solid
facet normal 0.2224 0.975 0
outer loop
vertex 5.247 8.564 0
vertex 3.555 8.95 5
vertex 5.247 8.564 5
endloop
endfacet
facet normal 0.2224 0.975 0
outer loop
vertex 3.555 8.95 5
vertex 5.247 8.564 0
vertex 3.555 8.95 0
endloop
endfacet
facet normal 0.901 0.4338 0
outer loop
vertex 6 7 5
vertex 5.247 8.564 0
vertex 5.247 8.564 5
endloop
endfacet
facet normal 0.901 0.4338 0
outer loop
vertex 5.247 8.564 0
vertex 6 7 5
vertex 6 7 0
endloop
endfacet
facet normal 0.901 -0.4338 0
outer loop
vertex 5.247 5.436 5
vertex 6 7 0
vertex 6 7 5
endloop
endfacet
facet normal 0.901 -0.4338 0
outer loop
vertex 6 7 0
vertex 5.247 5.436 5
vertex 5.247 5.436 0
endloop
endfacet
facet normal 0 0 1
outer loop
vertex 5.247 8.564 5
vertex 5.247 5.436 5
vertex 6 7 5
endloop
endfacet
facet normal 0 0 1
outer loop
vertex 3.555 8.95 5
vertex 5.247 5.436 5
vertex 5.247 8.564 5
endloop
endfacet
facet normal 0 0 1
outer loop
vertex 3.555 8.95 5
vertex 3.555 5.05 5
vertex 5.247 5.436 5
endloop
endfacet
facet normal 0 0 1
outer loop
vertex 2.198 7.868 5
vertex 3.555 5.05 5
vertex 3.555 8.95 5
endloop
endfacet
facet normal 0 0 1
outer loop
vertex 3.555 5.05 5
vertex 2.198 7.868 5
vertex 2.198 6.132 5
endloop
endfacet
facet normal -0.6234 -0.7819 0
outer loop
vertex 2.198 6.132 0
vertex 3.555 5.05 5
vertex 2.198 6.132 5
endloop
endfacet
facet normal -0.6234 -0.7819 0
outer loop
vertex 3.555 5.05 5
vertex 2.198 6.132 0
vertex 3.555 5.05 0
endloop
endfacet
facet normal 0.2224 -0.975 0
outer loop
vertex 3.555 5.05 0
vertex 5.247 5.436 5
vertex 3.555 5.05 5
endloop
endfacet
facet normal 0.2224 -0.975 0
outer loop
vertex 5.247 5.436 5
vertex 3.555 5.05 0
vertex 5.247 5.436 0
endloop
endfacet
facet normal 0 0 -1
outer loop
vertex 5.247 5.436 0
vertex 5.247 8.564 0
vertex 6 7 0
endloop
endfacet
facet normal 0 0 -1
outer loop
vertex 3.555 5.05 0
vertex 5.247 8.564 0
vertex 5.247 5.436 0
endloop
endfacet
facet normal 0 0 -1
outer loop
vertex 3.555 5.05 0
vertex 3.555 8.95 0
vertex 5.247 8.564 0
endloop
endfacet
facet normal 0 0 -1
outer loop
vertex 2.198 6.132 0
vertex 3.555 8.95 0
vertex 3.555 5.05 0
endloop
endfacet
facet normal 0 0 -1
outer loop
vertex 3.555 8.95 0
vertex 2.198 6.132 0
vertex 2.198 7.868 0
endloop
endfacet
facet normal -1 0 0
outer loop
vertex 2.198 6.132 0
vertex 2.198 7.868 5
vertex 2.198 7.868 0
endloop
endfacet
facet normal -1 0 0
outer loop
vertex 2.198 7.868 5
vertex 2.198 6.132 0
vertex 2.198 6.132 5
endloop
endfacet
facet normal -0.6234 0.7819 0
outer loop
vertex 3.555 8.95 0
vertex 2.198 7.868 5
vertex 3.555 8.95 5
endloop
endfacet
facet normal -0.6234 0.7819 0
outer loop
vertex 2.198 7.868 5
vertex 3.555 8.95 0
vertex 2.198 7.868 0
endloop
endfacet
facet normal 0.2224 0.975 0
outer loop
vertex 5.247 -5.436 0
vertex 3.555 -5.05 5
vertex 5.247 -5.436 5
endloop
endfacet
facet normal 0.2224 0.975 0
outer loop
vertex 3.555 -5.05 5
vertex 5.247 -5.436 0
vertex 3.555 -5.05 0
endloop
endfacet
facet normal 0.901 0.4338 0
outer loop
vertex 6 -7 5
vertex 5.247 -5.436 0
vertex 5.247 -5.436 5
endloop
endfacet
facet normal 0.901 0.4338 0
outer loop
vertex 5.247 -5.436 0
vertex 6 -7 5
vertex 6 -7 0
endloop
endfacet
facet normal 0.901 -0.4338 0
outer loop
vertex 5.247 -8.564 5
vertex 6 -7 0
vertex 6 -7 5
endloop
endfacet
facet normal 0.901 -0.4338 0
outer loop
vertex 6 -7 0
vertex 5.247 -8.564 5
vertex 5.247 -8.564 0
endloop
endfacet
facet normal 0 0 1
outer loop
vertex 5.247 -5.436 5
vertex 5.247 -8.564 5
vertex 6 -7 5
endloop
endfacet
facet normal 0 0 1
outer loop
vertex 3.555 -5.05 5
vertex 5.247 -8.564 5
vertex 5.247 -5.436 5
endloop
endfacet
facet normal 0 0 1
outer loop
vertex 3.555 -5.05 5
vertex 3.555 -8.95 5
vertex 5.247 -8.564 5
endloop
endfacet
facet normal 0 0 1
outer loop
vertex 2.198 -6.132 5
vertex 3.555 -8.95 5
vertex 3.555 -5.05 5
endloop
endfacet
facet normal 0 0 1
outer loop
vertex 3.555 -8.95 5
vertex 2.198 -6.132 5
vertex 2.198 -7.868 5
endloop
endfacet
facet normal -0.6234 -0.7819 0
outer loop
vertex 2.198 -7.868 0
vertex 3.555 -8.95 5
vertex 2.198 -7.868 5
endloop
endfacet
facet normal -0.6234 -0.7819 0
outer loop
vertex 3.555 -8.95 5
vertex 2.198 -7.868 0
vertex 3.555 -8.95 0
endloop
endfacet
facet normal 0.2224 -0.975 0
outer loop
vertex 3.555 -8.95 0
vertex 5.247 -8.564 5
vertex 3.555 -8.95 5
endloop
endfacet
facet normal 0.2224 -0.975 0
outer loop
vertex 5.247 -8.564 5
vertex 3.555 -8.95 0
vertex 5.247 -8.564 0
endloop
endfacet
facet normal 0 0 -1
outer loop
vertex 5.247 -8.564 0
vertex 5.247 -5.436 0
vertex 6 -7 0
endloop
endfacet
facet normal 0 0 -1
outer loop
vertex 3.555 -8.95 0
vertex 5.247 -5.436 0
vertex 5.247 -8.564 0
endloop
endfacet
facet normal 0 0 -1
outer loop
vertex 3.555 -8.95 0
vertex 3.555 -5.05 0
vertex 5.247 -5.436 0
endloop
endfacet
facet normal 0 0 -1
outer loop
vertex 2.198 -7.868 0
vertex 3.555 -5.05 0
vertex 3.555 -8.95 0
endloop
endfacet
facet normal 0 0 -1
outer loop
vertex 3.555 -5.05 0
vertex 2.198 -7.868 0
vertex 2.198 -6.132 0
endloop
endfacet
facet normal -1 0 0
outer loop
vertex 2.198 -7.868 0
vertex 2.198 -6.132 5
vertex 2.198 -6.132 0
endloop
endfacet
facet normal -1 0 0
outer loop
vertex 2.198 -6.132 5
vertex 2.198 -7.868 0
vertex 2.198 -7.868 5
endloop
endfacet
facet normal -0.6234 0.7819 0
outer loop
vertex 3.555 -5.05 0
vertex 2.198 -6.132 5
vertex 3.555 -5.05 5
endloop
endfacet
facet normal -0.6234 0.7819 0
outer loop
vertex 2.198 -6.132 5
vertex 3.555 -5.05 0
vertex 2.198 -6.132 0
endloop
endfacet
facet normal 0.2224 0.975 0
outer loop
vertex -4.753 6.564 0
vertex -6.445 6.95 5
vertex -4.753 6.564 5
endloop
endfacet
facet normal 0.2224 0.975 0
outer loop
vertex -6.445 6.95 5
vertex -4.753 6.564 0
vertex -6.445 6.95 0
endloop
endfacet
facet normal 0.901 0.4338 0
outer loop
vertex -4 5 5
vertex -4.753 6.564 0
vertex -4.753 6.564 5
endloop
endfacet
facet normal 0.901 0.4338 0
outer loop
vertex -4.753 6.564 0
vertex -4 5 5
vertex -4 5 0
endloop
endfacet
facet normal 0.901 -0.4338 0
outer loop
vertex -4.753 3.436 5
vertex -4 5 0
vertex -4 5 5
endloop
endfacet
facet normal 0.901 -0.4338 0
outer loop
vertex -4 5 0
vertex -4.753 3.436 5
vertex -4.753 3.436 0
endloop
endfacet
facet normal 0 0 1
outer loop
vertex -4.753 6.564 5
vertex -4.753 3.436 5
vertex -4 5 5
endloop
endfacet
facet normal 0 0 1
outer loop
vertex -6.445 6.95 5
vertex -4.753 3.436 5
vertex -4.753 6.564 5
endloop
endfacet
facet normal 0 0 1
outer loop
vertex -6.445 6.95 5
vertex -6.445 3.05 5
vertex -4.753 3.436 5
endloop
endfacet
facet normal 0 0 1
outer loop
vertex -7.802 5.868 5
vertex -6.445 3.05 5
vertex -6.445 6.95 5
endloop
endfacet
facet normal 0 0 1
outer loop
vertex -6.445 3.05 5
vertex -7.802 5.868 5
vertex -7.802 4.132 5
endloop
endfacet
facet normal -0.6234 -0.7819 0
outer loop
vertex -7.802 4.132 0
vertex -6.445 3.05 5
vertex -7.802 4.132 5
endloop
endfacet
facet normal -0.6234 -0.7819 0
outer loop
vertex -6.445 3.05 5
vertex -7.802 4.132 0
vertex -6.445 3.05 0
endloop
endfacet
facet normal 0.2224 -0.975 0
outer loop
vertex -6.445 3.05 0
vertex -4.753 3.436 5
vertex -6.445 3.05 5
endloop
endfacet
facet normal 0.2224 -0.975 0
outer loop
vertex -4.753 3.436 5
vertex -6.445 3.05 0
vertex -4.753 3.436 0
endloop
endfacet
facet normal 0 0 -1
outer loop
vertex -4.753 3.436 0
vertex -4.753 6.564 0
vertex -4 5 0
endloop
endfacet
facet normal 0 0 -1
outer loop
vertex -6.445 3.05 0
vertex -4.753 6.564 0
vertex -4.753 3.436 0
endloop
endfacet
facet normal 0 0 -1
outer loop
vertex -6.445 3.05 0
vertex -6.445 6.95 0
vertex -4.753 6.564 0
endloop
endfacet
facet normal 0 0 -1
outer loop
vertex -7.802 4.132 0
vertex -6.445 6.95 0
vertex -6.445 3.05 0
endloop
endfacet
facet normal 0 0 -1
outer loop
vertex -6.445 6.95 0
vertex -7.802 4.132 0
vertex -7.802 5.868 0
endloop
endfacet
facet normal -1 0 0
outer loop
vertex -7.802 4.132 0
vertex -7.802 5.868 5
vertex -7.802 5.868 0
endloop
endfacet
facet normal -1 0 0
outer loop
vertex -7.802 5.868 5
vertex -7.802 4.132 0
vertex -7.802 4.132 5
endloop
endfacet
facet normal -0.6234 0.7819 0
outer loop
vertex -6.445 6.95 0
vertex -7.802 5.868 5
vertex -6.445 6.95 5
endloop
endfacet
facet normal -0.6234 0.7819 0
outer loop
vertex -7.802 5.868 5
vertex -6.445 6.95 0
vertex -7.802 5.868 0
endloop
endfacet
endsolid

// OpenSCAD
union() {
  translate([4, 7, 0]) cylinder(r=2, h=5, center=false);
  translate([4, -7, 0]) cylinder(r=2, h=5, center=false);
  translate([-6, 5, 0]) cylinder(r=2, h=5, center=false);
}
